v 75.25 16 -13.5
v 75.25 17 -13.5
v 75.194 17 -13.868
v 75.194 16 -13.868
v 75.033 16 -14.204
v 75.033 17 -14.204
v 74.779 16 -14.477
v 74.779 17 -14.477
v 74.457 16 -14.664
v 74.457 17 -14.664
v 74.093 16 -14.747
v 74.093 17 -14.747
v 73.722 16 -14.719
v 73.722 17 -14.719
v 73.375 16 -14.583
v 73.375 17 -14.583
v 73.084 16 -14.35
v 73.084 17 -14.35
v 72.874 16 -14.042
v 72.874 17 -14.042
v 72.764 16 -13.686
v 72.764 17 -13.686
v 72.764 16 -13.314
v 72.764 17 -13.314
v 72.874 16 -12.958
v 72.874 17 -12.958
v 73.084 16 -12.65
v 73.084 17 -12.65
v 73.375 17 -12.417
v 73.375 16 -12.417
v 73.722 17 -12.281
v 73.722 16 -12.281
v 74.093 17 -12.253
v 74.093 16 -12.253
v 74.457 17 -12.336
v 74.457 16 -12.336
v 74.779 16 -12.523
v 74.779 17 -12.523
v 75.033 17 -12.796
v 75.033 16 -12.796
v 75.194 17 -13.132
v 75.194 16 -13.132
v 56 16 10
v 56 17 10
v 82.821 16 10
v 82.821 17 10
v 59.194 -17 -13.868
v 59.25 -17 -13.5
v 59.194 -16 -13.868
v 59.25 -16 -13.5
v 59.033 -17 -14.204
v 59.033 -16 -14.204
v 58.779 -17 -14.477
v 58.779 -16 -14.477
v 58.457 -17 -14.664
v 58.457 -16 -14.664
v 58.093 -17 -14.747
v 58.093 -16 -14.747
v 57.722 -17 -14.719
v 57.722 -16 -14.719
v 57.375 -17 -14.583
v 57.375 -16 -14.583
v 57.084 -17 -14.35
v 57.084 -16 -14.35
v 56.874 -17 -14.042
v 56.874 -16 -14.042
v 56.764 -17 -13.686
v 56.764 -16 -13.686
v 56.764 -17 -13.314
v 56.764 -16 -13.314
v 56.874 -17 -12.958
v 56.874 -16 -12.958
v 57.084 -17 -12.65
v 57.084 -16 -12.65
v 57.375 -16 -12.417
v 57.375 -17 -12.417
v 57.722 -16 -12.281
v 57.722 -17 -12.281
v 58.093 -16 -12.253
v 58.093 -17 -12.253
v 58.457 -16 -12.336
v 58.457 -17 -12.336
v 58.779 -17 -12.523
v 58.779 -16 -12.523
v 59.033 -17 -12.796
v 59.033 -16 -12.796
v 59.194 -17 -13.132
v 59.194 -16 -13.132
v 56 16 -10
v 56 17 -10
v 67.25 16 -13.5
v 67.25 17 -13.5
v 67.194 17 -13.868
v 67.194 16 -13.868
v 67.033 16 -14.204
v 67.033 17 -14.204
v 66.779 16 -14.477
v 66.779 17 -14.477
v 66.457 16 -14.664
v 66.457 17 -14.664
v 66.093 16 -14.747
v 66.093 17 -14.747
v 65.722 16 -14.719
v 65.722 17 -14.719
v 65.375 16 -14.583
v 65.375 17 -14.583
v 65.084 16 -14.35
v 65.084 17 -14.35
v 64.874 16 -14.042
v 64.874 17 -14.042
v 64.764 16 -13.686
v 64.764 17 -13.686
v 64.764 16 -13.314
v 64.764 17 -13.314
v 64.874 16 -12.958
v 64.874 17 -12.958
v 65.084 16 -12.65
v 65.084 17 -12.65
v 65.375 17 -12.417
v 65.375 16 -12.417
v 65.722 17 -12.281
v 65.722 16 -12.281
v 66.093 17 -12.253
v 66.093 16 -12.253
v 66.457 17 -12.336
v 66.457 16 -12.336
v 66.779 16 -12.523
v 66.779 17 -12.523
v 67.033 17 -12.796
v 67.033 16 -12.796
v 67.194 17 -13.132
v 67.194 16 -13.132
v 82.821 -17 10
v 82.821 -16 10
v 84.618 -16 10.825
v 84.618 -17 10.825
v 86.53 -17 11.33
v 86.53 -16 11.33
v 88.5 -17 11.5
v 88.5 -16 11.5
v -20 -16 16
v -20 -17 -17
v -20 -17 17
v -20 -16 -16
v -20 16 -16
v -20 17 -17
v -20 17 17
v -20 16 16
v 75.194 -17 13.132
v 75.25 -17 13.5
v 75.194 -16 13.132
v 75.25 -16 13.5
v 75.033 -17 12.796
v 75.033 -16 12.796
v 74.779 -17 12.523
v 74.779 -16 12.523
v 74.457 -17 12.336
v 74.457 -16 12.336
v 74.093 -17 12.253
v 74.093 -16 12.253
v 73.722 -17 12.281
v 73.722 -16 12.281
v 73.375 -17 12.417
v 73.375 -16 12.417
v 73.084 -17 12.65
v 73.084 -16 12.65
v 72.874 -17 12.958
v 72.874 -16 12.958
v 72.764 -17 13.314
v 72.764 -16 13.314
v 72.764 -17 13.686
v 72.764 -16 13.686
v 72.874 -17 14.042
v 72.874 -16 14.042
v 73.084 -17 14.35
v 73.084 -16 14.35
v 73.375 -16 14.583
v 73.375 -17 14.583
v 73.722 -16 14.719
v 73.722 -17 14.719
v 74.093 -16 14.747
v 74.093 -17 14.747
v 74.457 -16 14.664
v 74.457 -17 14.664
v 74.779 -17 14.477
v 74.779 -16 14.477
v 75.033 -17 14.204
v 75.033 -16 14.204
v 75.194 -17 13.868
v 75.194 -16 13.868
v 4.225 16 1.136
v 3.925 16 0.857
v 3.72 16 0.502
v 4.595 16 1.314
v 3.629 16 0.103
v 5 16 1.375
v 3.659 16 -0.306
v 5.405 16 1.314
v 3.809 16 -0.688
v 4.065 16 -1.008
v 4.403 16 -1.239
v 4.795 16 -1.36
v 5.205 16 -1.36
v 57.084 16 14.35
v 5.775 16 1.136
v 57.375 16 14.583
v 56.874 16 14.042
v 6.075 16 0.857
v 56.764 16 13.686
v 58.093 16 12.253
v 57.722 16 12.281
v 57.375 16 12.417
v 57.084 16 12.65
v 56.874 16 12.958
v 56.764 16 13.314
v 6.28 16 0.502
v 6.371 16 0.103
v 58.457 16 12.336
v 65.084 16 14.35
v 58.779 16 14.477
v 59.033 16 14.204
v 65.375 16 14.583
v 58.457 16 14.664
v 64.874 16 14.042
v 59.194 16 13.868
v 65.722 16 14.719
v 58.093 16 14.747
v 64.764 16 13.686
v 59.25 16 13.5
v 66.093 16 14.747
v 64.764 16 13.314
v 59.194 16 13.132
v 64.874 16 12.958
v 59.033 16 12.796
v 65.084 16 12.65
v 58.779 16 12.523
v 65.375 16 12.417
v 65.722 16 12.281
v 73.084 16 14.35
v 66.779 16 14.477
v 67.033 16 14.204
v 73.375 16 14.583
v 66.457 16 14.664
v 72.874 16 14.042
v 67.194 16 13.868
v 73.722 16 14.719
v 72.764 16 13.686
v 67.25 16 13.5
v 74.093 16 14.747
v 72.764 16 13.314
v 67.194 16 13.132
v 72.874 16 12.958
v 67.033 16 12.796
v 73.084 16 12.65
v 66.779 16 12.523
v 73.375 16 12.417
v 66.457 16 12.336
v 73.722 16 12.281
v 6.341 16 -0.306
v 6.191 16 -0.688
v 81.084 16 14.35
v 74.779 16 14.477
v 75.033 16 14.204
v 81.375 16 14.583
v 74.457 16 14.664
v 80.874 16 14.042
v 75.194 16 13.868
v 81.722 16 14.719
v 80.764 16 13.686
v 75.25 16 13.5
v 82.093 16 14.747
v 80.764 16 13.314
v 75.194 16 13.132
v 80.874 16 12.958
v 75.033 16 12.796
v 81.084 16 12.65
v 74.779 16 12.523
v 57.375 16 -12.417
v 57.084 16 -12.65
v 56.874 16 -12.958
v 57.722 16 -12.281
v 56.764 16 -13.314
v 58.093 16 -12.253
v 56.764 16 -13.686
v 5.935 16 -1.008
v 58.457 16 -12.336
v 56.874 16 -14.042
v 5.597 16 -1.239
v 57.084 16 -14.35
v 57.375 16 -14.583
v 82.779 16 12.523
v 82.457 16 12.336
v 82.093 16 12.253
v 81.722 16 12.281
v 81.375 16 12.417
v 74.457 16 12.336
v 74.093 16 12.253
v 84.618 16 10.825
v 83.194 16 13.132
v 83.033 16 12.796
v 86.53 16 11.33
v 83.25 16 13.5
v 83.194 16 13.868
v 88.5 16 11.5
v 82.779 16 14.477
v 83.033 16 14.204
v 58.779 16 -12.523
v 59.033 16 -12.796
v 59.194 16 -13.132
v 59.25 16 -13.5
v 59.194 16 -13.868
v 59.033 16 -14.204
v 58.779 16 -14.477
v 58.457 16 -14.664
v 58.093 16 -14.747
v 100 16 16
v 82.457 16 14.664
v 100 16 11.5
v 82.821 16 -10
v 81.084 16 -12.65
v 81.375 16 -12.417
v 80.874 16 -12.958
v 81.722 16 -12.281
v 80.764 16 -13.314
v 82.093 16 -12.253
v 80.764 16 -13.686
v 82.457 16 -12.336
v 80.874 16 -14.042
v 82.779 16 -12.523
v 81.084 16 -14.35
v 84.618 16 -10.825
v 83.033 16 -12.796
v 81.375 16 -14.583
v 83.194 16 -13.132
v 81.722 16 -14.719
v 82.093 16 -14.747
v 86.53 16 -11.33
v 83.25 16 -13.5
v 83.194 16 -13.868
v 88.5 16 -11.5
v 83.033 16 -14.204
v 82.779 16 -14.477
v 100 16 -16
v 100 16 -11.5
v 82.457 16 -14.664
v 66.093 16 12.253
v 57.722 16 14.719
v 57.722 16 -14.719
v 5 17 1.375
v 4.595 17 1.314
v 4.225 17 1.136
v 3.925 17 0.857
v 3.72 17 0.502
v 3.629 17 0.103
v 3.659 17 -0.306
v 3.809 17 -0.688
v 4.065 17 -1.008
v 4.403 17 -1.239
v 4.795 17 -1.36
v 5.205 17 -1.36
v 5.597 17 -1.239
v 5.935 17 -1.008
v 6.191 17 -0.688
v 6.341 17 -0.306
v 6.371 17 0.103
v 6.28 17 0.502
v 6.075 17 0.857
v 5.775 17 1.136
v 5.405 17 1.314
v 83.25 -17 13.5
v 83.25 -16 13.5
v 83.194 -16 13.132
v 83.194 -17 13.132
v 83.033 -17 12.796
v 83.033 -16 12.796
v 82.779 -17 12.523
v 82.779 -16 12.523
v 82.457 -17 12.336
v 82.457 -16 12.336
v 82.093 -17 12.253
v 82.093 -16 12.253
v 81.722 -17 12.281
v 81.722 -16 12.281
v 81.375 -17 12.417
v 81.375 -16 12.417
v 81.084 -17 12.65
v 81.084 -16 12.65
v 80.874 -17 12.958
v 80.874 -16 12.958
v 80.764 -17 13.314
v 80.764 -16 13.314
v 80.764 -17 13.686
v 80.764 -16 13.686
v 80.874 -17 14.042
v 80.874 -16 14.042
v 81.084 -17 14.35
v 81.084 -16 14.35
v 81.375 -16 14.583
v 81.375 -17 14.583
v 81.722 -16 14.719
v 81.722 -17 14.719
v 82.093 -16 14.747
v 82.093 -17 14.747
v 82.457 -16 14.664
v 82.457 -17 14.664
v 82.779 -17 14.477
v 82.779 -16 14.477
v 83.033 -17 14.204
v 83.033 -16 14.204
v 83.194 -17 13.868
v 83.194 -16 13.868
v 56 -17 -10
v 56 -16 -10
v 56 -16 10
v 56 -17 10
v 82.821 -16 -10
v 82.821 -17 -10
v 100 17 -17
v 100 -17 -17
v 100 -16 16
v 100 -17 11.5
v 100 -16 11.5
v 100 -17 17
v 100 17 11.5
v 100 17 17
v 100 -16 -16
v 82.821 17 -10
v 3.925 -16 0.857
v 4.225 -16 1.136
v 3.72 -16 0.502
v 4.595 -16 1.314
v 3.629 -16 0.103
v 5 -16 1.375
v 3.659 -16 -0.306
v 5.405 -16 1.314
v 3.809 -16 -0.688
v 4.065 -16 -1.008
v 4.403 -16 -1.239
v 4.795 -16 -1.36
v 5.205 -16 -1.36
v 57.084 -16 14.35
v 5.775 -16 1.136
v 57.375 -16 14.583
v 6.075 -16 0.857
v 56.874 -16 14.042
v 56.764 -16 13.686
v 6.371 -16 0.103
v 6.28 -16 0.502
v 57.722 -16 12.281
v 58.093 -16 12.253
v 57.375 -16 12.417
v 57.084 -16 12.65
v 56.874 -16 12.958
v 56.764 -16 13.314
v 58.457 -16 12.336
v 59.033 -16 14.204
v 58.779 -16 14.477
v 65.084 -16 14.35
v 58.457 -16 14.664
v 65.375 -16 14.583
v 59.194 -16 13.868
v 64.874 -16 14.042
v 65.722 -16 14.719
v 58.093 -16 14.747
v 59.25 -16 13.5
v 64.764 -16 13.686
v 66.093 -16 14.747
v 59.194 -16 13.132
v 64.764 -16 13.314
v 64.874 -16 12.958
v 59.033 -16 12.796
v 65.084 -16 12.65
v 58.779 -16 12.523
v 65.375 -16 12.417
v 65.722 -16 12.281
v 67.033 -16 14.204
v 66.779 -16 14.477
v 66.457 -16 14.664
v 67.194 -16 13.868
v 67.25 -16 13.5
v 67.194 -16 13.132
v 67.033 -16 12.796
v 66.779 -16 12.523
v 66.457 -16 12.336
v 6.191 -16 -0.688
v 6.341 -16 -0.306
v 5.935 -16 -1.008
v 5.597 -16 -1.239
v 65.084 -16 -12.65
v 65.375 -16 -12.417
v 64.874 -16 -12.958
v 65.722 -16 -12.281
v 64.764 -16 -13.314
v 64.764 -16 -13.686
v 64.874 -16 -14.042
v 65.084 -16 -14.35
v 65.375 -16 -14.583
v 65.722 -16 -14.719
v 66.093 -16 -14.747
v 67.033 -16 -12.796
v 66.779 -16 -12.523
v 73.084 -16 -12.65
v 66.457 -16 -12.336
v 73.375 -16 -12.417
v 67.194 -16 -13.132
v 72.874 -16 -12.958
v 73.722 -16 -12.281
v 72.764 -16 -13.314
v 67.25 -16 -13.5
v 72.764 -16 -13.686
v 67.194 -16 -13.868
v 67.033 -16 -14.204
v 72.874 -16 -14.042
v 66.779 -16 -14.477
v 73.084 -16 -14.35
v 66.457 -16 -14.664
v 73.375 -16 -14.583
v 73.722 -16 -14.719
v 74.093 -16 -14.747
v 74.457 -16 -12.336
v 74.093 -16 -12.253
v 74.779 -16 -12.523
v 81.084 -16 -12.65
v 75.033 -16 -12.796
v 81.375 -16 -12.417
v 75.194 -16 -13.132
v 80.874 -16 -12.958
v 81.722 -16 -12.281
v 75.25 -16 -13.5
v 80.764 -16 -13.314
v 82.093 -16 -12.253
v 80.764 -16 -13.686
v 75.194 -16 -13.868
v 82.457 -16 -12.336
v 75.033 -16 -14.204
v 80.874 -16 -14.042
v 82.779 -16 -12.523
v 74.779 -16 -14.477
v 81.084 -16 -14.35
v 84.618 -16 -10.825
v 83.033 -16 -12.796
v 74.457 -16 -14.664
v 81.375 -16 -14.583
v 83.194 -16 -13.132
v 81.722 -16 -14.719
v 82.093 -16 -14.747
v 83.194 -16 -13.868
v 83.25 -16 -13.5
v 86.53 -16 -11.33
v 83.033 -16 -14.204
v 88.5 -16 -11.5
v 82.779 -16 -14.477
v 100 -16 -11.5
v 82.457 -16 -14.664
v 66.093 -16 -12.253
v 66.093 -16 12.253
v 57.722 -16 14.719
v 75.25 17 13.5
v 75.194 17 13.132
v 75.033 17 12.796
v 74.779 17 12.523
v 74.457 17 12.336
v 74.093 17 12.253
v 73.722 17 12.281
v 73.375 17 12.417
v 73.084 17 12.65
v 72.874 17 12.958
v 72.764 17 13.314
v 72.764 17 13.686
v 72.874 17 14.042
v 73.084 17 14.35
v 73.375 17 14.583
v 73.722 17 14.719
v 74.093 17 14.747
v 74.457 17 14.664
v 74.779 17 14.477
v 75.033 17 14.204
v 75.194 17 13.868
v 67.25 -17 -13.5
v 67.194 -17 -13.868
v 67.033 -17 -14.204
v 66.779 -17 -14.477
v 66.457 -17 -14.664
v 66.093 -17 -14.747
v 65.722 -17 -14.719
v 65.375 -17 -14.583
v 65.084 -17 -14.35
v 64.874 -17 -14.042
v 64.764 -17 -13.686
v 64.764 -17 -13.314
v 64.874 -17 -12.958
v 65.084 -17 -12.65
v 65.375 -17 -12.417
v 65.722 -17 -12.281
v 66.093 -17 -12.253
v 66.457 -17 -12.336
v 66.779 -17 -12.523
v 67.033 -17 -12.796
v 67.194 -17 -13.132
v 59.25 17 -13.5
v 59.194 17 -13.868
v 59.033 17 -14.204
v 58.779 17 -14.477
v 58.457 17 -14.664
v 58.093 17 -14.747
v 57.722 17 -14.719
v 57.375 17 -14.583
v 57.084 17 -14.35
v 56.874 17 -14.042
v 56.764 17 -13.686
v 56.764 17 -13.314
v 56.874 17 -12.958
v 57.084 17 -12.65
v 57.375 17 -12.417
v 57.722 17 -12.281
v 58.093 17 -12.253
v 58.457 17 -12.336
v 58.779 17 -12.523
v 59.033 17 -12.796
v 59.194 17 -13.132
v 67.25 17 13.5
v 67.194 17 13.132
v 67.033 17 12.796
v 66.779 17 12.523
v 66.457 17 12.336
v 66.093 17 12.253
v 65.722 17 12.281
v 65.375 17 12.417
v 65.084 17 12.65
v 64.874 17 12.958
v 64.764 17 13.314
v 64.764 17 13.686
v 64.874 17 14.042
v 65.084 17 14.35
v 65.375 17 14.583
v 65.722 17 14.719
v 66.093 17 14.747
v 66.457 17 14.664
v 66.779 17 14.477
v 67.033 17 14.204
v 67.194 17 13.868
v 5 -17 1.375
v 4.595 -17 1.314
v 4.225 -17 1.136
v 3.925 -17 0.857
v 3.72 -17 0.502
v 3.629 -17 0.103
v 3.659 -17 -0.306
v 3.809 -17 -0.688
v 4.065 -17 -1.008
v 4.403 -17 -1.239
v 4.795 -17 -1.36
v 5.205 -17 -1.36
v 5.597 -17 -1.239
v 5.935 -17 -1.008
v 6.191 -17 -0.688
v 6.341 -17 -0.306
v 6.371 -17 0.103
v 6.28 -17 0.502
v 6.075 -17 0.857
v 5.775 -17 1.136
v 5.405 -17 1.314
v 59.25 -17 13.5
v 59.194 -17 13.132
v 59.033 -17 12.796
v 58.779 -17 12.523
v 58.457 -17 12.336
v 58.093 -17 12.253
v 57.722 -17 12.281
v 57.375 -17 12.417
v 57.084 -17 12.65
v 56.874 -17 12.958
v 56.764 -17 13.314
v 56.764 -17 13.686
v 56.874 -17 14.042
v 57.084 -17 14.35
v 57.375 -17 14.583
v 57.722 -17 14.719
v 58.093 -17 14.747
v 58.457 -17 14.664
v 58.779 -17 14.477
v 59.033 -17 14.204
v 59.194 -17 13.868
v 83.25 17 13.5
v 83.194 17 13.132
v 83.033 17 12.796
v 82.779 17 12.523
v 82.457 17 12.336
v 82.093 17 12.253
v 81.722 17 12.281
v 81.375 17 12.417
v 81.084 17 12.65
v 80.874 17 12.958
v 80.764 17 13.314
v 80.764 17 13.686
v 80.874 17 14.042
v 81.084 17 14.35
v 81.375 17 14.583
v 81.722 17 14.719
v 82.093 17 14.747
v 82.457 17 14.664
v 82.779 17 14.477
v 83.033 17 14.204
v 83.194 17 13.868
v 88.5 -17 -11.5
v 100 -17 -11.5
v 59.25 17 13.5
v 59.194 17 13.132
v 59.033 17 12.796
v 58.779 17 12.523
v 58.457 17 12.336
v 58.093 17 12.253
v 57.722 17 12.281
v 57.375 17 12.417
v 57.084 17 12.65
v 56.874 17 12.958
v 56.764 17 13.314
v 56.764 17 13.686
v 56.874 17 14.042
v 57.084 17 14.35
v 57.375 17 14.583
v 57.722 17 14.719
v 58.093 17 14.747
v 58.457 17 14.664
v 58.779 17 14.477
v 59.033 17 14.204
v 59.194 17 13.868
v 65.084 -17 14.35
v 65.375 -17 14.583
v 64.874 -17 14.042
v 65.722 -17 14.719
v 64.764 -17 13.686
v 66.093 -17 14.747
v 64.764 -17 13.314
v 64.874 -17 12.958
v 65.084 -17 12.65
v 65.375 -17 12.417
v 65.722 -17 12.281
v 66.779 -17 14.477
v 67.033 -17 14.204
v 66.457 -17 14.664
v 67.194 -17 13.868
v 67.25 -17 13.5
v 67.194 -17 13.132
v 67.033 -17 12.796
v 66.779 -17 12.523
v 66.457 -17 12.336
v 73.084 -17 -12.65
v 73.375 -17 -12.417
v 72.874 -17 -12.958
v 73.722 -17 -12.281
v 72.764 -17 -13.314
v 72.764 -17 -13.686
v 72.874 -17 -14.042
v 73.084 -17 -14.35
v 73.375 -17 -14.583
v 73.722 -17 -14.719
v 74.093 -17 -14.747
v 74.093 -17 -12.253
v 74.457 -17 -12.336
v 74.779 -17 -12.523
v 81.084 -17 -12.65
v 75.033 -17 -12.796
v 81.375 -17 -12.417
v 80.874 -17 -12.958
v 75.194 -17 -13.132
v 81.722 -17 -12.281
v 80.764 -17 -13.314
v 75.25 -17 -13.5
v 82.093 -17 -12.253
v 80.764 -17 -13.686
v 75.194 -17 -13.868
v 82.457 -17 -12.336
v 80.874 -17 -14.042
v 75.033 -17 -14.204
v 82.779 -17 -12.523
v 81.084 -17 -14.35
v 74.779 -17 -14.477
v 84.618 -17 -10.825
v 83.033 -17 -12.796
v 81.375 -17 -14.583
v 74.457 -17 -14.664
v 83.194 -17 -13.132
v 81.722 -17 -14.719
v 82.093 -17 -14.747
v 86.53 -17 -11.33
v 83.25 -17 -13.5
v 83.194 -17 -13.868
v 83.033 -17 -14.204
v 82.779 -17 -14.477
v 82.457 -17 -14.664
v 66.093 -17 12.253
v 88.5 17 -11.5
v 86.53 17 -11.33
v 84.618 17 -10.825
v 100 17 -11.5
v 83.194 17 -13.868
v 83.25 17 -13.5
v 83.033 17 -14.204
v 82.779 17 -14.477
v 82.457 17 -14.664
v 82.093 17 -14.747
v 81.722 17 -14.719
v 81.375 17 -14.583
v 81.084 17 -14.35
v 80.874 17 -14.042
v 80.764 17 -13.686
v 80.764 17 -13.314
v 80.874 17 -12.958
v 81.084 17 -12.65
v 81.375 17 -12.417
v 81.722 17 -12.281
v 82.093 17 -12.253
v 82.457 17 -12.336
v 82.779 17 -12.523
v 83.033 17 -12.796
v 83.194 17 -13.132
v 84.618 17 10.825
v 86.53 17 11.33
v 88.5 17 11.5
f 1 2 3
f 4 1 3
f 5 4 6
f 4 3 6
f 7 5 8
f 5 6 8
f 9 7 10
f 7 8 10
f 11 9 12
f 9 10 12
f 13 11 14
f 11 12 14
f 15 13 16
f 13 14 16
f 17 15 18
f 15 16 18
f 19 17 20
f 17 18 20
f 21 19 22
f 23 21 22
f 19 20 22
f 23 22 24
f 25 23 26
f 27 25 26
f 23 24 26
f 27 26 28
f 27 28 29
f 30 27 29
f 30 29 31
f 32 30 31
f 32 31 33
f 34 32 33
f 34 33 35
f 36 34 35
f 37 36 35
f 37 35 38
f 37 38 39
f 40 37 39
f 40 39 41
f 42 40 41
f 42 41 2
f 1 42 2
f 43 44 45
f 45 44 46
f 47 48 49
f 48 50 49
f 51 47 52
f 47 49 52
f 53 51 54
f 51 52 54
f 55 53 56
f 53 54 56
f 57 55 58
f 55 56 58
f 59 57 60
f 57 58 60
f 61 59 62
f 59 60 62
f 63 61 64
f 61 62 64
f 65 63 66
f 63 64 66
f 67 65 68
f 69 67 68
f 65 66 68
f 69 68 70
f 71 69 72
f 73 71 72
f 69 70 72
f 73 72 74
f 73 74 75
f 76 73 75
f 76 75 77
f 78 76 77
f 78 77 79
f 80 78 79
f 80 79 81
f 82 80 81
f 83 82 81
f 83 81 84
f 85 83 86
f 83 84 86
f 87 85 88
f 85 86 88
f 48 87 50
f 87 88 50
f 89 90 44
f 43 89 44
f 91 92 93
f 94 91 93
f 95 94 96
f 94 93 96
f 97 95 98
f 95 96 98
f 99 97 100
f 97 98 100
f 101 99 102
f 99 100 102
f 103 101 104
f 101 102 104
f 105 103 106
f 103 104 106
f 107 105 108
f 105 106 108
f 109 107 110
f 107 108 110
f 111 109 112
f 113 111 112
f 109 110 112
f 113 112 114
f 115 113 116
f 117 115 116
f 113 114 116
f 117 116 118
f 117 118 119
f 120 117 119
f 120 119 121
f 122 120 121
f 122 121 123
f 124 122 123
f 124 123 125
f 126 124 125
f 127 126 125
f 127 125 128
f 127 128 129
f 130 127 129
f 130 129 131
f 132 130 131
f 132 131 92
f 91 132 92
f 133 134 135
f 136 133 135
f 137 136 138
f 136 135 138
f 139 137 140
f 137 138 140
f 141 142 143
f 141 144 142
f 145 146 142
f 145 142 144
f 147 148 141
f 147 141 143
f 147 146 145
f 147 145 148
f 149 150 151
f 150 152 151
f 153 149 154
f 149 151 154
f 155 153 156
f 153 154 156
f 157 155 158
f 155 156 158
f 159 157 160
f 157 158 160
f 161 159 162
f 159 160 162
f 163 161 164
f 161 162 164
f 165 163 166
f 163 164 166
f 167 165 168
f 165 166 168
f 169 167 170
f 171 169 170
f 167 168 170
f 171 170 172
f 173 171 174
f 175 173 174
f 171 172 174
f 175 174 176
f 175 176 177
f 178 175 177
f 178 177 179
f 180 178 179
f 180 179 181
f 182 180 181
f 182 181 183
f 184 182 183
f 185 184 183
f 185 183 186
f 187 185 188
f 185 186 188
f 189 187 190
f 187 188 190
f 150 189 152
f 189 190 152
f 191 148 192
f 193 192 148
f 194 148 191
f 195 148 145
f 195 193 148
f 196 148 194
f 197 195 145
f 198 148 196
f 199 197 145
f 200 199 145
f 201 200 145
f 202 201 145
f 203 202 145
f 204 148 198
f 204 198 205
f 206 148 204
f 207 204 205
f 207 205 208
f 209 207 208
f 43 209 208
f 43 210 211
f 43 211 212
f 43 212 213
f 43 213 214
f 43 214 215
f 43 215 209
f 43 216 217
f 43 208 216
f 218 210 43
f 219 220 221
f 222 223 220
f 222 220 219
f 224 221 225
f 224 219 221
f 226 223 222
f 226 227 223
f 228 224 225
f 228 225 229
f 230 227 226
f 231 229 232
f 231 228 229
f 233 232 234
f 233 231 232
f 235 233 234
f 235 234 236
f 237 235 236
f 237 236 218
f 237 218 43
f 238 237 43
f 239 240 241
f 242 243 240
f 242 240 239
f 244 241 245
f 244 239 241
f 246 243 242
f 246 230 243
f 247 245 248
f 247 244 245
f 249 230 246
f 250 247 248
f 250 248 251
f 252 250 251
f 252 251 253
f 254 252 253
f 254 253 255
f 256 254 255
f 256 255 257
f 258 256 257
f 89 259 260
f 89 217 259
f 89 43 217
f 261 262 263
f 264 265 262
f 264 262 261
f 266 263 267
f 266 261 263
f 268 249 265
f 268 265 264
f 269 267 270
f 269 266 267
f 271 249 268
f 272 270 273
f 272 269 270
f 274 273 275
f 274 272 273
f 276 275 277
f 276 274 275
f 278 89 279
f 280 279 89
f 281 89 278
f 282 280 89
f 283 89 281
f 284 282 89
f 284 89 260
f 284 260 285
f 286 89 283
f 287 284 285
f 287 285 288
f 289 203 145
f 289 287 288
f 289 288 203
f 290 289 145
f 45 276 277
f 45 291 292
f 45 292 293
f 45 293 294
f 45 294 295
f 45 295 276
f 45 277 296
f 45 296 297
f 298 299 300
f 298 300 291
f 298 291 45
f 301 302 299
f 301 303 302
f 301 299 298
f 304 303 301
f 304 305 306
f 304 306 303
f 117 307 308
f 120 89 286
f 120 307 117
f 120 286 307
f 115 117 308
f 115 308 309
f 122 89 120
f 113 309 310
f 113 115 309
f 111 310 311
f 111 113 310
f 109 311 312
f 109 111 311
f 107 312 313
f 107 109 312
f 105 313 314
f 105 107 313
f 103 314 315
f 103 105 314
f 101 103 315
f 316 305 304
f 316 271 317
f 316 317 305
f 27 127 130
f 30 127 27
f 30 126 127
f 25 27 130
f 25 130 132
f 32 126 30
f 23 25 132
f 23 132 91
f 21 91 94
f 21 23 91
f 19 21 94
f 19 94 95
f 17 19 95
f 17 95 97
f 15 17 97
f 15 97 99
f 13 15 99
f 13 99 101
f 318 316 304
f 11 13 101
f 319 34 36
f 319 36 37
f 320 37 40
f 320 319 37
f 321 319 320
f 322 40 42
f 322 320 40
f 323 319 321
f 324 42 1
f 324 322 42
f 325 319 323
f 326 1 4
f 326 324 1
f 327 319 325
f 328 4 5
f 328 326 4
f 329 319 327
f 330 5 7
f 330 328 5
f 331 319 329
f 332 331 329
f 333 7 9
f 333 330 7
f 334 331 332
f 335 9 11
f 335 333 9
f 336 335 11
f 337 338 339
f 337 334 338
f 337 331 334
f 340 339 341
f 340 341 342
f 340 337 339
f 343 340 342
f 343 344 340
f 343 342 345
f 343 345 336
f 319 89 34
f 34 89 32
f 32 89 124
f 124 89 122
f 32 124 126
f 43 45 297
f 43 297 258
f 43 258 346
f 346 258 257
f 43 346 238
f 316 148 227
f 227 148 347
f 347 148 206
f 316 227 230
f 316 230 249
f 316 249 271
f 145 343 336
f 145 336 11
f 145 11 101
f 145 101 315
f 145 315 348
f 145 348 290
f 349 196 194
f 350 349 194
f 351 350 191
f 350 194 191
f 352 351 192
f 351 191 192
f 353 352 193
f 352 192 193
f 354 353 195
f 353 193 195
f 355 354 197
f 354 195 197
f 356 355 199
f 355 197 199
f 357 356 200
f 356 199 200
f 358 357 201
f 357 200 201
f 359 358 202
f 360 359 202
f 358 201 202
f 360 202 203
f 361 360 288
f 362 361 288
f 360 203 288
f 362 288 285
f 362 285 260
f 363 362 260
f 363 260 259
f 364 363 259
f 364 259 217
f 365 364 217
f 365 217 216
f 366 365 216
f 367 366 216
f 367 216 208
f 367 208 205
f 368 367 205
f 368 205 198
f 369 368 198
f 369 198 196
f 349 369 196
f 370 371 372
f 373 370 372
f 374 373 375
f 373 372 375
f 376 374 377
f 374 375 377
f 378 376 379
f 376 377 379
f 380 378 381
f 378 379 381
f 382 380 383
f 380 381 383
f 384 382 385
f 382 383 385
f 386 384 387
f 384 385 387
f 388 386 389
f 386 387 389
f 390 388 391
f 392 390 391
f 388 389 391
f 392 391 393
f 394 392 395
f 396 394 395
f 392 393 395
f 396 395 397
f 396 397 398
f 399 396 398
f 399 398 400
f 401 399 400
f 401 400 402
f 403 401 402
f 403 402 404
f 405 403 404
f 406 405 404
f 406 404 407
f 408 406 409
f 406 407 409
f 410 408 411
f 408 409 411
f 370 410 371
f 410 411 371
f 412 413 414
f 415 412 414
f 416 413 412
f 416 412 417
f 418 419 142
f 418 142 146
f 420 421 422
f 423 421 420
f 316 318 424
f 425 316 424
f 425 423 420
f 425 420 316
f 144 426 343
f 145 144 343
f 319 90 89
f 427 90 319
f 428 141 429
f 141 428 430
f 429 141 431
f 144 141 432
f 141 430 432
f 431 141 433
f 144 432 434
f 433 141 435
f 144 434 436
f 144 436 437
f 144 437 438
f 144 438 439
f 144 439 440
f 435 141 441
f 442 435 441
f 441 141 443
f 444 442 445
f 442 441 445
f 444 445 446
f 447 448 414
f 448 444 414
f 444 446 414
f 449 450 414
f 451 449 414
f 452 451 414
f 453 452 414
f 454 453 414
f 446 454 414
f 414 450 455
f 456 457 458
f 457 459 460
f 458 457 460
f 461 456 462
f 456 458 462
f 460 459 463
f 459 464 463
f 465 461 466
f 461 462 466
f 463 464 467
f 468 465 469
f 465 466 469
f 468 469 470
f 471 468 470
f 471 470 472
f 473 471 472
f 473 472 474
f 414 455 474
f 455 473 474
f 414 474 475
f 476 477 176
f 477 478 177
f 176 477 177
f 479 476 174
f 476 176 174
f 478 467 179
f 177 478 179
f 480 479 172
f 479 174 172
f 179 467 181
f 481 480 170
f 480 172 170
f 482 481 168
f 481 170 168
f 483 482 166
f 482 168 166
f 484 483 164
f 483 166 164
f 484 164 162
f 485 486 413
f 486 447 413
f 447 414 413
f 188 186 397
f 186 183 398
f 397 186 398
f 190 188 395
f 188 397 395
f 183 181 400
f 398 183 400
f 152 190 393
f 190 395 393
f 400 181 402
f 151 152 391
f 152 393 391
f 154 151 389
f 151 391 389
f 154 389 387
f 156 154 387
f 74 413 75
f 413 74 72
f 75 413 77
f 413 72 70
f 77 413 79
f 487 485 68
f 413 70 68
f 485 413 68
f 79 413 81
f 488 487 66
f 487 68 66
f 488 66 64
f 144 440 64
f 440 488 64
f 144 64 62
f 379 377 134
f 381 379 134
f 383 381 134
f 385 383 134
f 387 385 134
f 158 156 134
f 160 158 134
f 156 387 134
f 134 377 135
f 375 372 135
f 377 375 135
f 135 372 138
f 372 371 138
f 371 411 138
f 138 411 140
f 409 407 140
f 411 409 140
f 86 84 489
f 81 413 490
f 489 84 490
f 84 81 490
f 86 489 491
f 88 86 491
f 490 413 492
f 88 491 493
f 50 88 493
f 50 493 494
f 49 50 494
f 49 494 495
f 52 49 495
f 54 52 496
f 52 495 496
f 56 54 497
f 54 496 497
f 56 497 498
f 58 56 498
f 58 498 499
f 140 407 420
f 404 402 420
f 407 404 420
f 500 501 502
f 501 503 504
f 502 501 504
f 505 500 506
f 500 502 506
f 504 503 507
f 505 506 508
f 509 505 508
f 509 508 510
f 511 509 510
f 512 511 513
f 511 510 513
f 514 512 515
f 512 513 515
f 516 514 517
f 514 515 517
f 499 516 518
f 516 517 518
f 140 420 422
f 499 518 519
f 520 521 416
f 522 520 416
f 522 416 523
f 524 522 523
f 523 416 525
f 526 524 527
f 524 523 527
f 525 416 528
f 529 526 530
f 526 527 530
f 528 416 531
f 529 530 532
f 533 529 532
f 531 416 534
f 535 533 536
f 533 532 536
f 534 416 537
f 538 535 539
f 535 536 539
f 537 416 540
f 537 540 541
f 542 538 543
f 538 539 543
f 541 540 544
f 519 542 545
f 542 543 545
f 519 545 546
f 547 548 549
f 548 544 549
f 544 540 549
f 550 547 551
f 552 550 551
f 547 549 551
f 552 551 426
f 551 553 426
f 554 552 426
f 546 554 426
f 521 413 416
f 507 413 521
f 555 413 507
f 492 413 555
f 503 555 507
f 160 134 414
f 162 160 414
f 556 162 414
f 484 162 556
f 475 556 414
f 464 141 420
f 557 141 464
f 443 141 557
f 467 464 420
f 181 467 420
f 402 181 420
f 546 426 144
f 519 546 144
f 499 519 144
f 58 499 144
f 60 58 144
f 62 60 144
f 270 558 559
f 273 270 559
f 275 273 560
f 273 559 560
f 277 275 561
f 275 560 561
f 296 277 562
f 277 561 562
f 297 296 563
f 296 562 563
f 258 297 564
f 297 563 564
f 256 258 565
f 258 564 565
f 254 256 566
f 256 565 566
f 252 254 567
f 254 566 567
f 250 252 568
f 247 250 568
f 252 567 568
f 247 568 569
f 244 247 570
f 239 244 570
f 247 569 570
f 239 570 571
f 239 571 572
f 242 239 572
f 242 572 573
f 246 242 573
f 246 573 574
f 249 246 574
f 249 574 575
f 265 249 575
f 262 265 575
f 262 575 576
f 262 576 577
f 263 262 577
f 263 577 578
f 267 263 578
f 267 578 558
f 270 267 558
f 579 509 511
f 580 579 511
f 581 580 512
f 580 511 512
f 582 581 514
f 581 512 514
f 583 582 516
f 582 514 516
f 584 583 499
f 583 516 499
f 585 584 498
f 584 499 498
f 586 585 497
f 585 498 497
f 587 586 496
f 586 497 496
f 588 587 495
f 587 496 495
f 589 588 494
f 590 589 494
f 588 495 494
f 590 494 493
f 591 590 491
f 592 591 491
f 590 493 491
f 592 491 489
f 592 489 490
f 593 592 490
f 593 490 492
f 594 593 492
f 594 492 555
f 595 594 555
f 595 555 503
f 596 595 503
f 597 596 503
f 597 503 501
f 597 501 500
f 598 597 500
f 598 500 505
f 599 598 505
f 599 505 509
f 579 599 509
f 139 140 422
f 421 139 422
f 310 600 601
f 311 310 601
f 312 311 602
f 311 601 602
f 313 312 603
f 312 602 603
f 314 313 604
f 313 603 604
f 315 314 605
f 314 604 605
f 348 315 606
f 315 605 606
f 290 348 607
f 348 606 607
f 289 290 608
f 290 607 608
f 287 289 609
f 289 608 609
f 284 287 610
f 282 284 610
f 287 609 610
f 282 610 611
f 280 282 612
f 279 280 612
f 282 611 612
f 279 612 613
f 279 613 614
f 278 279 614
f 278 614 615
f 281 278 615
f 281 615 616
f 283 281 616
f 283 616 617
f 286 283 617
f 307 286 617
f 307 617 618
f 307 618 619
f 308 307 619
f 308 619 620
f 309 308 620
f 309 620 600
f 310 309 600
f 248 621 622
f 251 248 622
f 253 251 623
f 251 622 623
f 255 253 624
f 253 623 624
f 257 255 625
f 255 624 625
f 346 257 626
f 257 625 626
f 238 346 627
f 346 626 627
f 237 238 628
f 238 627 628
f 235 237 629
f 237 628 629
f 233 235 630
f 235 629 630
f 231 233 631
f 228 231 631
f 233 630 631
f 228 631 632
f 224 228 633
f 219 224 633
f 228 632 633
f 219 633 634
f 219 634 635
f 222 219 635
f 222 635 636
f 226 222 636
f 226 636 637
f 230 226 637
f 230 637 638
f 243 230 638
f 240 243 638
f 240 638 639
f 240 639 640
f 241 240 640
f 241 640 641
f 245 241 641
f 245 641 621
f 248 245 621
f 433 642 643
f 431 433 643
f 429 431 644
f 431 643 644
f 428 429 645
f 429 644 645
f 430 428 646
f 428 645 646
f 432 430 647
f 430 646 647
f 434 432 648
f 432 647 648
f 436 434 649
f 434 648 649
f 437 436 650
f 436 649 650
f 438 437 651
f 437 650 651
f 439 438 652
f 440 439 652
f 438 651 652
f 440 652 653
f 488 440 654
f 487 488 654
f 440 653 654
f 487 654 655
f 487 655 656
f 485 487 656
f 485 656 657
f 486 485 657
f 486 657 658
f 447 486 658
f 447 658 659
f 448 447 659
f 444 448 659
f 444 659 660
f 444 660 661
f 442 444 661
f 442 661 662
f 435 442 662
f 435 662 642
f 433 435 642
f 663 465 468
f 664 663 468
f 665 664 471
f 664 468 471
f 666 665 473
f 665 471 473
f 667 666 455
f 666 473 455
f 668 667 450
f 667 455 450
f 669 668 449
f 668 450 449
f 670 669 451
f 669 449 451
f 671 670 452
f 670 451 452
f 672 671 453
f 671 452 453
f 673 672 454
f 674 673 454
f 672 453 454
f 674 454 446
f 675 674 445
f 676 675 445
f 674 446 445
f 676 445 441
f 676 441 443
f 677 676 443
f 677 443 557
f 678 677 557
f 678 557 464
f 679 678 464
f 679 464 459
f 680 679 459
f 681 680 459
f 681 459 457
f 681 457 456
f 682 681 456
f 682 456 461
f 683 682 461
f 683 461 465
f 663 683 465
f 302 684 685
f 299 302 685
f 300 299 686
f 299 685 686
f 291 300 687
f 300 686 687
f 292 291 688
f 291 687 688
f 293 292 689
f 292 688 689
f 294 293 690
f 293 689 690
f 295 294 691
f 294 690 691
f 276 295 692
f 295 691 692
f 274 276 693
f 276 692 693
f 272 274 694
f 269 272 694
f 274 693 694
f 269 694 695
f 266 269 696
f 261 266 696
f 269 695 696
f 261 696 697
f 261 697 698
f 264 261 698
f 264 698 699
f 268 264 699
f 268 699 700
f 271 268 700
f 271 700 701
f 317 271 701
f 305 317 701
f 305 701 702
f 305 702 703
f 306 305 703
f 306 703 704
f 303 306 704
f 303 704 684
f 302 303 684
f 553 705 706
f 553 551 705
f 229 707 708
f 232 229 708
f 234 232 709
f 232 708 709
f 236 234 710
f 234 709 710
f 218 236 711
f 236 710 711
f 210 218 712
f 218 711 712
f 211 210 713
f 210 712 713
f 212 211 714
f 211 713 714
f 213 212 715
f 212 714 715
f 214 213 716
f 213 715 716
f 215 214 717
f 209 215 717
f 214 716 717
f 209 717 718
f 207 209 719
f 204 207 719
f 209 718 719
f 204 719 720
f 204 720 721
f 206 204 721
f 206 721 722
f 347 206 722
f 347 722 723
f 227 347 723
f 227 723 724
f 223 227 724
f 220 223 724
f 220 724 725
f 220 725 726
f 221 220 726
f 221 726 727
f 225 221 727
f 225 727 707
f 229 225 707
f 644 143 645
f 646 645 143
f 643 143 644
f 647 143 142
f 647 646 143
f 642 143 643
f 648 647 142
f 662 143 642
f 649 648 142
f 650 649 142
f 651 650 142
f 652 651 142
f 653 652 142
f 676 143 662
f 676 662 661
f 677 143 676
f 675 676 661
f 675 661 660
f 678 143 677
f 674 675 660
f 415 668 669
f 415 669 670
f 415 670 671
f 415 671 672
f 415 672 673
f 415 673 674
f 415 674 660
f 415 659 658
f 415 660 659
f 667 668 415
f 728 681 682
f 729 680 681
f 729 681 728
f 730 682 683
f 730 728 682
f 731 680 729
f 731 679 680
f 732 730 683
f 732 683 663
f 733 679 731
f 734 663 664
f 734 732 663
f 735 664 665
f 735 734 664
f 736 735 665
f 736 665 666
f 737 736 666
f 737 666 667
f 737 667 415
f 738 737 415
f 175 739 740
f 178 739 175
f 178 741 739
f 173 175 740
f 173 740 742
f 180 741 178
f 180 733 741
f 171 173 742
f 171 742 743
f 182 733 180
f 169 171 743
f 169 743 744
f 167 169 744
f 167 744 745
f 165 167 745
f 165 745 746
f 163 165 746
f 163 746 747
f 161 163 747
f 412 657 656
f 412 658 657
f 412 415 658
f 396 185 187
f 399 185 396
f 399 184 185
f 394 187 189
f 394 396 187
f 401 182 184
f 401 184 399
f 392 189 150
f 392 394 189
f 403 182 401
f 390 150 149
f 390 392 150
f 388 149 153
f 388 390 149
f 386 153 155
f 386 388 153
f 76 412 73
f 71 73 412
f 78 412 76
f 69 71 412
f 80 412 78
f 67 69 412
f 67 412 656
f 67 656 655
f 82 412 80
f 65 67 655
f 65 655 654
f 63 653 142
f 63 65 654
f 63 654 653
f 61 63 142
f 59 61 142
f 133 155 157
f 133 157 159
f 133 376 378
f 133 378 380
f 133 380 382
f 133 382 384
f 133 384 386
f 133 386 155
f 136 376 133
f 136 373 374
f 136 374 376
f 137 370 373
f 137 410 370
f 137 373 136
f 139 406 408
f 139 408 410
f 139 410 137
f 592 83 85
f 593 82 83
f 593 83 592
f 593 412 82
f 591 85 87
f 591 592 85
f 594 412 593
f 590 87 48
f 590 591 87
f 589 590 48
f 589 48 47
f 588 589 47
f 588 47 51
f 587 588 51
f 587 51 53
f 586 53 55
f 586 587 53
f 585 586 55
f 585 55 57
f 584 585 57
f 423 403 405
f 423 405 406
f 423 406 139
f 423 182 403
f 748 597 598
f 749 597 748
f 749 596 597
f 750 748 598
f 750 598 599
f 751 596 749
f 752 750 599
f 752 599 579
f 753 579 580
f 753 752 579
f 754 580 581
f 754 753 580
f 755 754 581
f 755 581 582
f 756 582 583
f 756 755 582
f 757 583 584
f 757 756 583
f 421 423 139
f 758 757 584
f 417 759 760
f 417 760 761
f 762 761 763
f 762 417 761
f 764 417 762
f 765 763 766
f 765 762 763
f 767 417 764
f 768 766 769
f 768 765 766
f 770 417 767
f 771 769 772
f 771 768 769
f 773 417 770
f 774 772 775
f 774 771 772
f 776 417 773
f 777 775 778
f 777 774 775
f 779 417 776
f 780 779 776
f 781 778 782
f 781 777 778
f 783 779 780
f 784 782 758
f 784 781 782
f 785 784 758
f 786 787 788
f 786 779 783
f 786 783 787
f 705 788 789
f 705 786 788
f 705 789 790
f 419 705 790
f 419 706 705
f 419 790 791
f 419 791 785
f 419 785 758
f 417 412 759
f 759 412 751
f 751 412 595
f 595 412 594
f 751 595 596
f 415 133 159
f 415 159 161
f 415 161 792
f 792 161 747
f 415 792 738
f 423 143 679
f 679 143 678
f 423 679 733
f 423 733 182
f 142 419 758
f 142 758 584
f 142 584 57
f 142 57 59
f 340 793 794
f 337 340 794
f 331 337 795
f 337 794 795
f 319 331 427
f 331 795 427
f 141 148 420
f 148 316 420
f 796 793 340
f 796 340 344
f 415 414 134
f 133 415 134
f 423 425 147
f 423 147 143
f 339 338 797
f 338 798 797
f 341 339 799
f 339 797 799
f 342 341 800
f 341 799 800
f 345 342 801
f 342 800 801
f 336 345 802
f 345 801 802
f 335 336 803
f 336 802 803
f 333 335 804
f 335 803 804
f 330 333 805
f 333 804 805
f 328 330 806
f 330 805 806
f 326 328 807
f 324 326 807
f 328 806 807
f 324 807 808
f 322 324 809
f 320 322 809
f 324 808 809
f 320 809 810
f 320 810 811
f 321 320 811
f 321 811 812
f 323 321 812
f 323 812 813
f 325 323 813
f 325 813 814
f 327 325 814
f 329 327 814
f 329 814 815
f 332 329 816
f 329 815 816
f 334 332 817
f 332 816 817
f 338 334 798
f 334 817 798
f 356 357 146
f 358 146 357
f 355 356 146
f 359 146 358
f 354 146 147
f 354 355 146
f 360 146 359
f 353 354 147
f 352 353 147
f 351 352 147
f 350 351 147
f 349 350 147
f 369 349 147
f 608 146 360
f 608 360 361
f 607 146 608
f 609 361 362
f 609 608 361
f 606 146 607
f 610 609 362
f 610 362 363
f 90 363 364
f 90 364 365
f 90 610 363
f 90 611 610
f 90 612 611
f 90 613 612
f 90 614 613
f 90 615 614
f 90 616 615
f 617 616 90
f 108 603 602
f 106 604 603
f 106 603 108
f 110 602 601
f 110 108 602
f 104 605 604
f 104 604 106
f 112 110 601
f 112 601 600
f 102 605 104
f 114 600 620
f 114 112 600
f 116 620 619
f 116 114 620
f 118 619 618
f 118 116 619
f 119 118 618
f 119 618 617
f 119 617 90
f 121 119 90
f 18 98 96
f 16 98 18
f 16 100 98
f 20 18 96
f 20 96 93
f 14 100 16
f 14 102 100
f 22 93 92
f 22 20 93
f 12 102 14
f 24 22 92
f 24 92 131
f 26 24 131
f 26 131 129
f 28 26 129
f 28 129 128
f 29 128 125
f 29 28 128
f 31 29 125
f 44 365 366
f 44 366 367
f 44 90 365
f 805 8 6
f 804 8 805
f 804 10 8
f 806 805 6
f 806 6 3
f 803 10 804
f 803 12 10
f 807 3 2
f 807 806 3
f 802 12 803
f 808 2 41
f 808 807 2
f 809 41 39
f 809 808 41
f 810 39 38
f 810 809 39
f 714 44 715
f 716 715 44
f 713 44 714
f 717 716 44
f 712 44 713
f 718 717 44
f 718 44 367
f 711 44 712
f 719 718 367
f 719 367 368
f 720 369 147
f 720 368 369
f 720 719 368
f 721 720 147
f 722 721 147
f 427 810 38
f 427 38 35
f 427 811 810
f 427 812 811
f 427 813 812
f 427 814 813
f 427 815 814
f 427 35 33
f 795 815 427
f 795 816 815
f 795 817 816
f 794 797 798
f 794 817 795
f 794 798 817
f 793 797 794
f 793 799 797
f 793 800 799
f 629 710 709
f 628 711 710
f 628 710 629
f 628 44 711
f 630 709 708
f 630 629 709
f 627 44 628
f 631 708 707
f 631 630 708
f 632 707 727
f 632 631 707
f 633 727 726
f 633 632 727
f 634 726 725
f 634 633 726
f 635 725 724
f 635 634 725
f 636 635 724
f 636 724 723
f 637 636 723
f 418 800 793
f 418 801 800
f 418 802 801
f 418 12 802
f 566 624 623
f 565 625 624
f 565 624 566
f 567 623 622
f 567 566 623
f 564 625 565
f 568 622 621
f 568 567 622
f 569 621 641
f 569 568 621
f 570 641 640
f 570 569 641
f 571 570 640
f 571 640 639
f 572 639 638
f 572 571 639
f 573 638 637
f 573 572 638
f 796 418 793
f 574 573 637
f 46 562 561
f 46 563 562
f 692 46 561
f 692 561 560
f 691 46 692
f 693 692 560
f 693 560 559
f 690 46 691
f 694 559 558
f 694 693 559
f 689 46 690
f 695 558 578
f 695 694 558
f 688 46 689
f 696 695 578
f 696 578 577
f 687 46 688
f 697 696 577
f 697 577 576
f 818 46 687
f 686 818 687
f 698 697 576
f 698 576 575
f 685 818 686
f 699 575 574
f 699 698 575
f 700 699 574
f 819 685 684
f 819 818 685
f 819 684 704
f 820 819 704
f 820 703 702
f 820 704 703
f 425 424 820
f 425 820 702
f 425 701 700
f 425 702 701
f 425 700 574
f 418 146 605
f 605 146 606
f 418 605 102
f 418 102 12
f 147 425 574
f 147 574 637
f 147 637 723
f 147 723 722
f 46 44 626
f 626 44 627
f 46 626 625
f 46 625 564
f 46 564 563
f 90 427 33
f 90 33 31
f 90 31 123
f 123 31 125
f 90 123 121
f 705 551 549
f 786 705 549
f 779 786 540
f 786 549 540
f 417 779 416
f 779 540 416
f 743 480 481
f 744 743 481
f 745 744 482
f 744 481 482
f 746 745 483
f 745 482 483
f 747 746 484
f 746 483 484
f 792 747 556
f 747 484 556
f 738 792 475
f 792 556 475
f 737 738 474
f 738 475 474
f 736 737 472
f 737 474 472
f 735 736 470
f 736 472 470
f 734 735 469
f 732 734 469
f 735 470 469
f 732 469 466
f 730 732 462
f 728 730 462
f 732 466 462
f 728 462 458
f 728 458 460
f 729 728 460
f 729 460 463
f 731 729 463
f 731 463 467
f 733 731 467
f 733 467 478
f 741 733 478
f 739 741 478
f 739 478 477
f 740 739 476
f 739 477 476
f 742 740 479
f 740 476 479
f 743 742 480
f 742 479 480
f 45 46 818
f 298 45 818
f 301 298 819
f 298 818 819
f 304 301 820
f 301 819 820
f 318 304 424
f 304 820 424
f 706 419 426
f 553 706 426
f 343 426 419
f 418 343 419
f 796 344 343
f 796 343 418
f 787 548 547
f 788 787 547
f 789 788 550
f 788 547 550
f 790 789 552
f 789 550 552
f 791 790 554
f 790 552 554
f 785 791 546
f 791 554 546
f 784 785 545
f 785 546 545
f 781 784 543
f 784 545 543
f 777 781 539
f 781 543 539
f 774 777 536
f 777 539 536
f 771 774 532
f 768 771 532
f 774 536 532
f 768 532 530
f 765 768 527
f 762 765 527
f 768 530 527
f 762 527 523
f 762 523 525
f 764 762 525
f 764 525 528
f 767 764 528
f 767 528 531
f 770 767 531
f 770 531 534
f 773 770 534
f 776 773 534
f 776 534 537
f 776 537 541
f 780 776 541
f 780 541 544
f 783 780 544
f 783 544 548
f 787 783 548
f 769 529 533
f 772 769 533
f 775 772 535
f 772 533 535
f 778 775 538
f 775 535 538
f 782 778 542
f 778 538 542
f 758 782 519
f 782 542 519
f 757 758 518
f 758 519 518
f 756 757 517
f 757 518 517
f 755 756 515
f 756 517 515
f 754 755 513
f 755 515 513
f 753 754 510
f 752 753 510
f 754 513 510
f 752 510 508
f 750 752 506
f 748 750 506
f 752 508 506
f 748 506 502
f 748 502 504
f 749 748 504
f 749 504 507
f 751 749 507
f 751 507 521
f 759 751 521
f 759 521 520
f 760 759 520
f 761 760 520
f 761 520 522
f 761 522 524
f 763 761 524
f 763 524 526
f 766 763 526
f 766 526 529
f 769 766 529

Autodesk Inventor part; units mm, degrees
ref_plane "YZ Plane" through (0, 0, 0) normal (1, 0, 0) x (0, 1, 0)
ref_plane "XZ Plane" through (0, 0, 0) normal (0, 1, 0) x (-1, 0, 0)
ref_plane "XY Plane" through (0, 0, 0) normal (0, 0, 1) x (1, 0, 0)
sketch "Boceto1" plane through (0, 0, 0) normal (1, 0, 0) x (0, 1, 0)
  line L0 (-16, 16) -> (16, 16)
  line L1 (16, 16) -> (16, -16)
  line L2 (16, -16) -> (-16, -16)
  line L3 (-16, -16) -> (-16, 16)
  line L4 (-16, 16) -> (16, -16) construction
  line L5 (16, 16) -> (-16, -16) construction
  line L6 (17, 17) -> (-17, 17)
  line L7 (-17, 17) -> (-17, -17)
  line L8 (-17, -17) -> (17, -17)
  line L9 (17, -17) -> (17, 17)
  line L10 (17, 17) -> (-17, -17) construction
  line L11 (-17, 17) -> (17, -17) construction
  point P0 (0, 0)
  dimension "d0" = 32
  dimension "d1" = 32
  dimension "d2" = 34
  dimension "d3" = 34
extrude "Extrusión1" add sketch "Boceto1" along normal blind 100
sketch "Boceto5" plane through (0, 17, 17) normal (0, 1, 0) x (1, 0, 0)
  line L0 (100, 1) -> (100, 33) projected
  line L1 (100, 17) -> (88.5, 17) construction
  line L2 (88.5, 17) -> (82, 17) construction
  line L3 (82, 17) -> (82, 30.5) construction
  circle A0 centre (82, 30.5) radius 1.25
  circle A1 centre (74, 30.5) radius 1.25
  line L4 (80.5, 17) -> (74, 17) construction
  circle A2 centre (66, 30.5) radius 1.25
  line L5 (72.5, 17) -> (66, 17) construction
  circle A3 centre (58, 30.5) radius 1.25
  line L6 (64.5, 17) -> (58, 17) construction
  circle A4 centre (82, 3.5) radius 1.25
  line L7 (88.5, -10) -> (82, -10) construction
  circle A5 centre (74, 3.5) radius 1.25
  line L8 (80.5, -10) -> (74, -10) construction
  circle A6 centre (66, 3.5) radius 1.25
  line L9 (72.5, -10) -> (66, -10) construction
  circle A7 centre (58, 3.5) radius 1.25
  line L10 (64.5, -10) -> (58, -10) construction
  circle A8 centre (88.5, 17) radius 11.5
  point P0 (0, 17)
  dimension "d26" = 11.5
  dimension "d27" = 6.5
  dimension "d28" = 13.5
  dimension "d29" = 2.5
  dimension "d32" = 8
  dimension "d35" = 27
  dimension "d38" = 23
extrude "Extrusión4" cut sketch "Boceto5" against normal through all
sketch "Boceto6" plane through (0, 17, 17) normal (0, 1, 0) x (1, 0, 0)
  line L0 (100, 17) -> (100, 34) projected
  line L1 (100, 17) -> (56, 17) construction
  line L2 (0, 0) -> (100, 0) projected
  line L3 (56, 0) -> (56, 7) construction
  line L4 (56, 34) -> (56, 27) construction
  line L5 (56, 27) -> (56, 7)
  line L6 (56, 7) -> (83.498, 7)
  line L7 (56, 0) -> (56, 7) construction
  line L8 (56, 27) -> (83.498, 27)
  line L9 (83.498, 27) -> (83.498, 7)
  point P0 (0, 17)
  dimension "d41" = 44
  dimension "d42" = 7
extrude "Extrusión5" cut sketch "Boceto6" against normal through all
sketch "Boceto7" plane through (0, 17, 17) normal (0, 1, 0) x (1, 0, 0)
  arc A0 (100, 17) -> (82.8211, 27) centre (88.5, 17) ccw projected
  line L0 (88.5, 17) -> (88.5, 28.5)
  line L1 (88.5, 28.5) -> (103.9894, 28.5)
  line L2 (88.5, 17) -> (100, 17) construction
  line L3 (88.5, 17) -> (88.5, 5.5)
  line L4 (88.5, 5.5) -> (103.9894, 5.5)
  line L5 (103.9894, 28.5) -> (103.9894, 5.5)
  point P0 (0, 17)
extrude "Extrusión6" cut sketch "Boceto7" against normal through all
sketch "Boceto8" plane through (0, 17, 17) normal (0, 1, 0) x (1, 0, 0)
  line L0 (0, 17) -> (5, 17)
  dimension "d47" = 5
hole "Agujero1" at (5, 17, 0) direction (0, -1, 0) diameter 2.75 end through all
sketch "Boceto9" plane through (0, 0, 0) normal (-1, 0, 0) x (0, 0, 1)
  line L0 (-11.5, 16) -> (-16, 16) projected
  line L1 (11.5, -16) -> (16, -16) projected
  line L2 (-16, 16) -> (16, 16)
  line L3 (16, 16) -> (16, -16)
  line L4 (16, -16) -> (-16, -16)
  line L5 (-16, -16) -> (-16, 16)
  line L6 (-17, 17) -> (17, 17) projected
  line L7 (17, 17) -> (17, -17) projected
  line L8 (-17, 17) -> (17, 17)
  line L9 (17, 17) -> (17, -17)
  line L10 (17, -17) -> (-17, -17)
  line L11 (-17, -17) -> (-17, 17)
  point P0 (0, 0)
extrude "Extrusión7" add sketch "Boceto9" along normal blind 20
properties part number "Eslabon_L" material "Plástico ABS"
